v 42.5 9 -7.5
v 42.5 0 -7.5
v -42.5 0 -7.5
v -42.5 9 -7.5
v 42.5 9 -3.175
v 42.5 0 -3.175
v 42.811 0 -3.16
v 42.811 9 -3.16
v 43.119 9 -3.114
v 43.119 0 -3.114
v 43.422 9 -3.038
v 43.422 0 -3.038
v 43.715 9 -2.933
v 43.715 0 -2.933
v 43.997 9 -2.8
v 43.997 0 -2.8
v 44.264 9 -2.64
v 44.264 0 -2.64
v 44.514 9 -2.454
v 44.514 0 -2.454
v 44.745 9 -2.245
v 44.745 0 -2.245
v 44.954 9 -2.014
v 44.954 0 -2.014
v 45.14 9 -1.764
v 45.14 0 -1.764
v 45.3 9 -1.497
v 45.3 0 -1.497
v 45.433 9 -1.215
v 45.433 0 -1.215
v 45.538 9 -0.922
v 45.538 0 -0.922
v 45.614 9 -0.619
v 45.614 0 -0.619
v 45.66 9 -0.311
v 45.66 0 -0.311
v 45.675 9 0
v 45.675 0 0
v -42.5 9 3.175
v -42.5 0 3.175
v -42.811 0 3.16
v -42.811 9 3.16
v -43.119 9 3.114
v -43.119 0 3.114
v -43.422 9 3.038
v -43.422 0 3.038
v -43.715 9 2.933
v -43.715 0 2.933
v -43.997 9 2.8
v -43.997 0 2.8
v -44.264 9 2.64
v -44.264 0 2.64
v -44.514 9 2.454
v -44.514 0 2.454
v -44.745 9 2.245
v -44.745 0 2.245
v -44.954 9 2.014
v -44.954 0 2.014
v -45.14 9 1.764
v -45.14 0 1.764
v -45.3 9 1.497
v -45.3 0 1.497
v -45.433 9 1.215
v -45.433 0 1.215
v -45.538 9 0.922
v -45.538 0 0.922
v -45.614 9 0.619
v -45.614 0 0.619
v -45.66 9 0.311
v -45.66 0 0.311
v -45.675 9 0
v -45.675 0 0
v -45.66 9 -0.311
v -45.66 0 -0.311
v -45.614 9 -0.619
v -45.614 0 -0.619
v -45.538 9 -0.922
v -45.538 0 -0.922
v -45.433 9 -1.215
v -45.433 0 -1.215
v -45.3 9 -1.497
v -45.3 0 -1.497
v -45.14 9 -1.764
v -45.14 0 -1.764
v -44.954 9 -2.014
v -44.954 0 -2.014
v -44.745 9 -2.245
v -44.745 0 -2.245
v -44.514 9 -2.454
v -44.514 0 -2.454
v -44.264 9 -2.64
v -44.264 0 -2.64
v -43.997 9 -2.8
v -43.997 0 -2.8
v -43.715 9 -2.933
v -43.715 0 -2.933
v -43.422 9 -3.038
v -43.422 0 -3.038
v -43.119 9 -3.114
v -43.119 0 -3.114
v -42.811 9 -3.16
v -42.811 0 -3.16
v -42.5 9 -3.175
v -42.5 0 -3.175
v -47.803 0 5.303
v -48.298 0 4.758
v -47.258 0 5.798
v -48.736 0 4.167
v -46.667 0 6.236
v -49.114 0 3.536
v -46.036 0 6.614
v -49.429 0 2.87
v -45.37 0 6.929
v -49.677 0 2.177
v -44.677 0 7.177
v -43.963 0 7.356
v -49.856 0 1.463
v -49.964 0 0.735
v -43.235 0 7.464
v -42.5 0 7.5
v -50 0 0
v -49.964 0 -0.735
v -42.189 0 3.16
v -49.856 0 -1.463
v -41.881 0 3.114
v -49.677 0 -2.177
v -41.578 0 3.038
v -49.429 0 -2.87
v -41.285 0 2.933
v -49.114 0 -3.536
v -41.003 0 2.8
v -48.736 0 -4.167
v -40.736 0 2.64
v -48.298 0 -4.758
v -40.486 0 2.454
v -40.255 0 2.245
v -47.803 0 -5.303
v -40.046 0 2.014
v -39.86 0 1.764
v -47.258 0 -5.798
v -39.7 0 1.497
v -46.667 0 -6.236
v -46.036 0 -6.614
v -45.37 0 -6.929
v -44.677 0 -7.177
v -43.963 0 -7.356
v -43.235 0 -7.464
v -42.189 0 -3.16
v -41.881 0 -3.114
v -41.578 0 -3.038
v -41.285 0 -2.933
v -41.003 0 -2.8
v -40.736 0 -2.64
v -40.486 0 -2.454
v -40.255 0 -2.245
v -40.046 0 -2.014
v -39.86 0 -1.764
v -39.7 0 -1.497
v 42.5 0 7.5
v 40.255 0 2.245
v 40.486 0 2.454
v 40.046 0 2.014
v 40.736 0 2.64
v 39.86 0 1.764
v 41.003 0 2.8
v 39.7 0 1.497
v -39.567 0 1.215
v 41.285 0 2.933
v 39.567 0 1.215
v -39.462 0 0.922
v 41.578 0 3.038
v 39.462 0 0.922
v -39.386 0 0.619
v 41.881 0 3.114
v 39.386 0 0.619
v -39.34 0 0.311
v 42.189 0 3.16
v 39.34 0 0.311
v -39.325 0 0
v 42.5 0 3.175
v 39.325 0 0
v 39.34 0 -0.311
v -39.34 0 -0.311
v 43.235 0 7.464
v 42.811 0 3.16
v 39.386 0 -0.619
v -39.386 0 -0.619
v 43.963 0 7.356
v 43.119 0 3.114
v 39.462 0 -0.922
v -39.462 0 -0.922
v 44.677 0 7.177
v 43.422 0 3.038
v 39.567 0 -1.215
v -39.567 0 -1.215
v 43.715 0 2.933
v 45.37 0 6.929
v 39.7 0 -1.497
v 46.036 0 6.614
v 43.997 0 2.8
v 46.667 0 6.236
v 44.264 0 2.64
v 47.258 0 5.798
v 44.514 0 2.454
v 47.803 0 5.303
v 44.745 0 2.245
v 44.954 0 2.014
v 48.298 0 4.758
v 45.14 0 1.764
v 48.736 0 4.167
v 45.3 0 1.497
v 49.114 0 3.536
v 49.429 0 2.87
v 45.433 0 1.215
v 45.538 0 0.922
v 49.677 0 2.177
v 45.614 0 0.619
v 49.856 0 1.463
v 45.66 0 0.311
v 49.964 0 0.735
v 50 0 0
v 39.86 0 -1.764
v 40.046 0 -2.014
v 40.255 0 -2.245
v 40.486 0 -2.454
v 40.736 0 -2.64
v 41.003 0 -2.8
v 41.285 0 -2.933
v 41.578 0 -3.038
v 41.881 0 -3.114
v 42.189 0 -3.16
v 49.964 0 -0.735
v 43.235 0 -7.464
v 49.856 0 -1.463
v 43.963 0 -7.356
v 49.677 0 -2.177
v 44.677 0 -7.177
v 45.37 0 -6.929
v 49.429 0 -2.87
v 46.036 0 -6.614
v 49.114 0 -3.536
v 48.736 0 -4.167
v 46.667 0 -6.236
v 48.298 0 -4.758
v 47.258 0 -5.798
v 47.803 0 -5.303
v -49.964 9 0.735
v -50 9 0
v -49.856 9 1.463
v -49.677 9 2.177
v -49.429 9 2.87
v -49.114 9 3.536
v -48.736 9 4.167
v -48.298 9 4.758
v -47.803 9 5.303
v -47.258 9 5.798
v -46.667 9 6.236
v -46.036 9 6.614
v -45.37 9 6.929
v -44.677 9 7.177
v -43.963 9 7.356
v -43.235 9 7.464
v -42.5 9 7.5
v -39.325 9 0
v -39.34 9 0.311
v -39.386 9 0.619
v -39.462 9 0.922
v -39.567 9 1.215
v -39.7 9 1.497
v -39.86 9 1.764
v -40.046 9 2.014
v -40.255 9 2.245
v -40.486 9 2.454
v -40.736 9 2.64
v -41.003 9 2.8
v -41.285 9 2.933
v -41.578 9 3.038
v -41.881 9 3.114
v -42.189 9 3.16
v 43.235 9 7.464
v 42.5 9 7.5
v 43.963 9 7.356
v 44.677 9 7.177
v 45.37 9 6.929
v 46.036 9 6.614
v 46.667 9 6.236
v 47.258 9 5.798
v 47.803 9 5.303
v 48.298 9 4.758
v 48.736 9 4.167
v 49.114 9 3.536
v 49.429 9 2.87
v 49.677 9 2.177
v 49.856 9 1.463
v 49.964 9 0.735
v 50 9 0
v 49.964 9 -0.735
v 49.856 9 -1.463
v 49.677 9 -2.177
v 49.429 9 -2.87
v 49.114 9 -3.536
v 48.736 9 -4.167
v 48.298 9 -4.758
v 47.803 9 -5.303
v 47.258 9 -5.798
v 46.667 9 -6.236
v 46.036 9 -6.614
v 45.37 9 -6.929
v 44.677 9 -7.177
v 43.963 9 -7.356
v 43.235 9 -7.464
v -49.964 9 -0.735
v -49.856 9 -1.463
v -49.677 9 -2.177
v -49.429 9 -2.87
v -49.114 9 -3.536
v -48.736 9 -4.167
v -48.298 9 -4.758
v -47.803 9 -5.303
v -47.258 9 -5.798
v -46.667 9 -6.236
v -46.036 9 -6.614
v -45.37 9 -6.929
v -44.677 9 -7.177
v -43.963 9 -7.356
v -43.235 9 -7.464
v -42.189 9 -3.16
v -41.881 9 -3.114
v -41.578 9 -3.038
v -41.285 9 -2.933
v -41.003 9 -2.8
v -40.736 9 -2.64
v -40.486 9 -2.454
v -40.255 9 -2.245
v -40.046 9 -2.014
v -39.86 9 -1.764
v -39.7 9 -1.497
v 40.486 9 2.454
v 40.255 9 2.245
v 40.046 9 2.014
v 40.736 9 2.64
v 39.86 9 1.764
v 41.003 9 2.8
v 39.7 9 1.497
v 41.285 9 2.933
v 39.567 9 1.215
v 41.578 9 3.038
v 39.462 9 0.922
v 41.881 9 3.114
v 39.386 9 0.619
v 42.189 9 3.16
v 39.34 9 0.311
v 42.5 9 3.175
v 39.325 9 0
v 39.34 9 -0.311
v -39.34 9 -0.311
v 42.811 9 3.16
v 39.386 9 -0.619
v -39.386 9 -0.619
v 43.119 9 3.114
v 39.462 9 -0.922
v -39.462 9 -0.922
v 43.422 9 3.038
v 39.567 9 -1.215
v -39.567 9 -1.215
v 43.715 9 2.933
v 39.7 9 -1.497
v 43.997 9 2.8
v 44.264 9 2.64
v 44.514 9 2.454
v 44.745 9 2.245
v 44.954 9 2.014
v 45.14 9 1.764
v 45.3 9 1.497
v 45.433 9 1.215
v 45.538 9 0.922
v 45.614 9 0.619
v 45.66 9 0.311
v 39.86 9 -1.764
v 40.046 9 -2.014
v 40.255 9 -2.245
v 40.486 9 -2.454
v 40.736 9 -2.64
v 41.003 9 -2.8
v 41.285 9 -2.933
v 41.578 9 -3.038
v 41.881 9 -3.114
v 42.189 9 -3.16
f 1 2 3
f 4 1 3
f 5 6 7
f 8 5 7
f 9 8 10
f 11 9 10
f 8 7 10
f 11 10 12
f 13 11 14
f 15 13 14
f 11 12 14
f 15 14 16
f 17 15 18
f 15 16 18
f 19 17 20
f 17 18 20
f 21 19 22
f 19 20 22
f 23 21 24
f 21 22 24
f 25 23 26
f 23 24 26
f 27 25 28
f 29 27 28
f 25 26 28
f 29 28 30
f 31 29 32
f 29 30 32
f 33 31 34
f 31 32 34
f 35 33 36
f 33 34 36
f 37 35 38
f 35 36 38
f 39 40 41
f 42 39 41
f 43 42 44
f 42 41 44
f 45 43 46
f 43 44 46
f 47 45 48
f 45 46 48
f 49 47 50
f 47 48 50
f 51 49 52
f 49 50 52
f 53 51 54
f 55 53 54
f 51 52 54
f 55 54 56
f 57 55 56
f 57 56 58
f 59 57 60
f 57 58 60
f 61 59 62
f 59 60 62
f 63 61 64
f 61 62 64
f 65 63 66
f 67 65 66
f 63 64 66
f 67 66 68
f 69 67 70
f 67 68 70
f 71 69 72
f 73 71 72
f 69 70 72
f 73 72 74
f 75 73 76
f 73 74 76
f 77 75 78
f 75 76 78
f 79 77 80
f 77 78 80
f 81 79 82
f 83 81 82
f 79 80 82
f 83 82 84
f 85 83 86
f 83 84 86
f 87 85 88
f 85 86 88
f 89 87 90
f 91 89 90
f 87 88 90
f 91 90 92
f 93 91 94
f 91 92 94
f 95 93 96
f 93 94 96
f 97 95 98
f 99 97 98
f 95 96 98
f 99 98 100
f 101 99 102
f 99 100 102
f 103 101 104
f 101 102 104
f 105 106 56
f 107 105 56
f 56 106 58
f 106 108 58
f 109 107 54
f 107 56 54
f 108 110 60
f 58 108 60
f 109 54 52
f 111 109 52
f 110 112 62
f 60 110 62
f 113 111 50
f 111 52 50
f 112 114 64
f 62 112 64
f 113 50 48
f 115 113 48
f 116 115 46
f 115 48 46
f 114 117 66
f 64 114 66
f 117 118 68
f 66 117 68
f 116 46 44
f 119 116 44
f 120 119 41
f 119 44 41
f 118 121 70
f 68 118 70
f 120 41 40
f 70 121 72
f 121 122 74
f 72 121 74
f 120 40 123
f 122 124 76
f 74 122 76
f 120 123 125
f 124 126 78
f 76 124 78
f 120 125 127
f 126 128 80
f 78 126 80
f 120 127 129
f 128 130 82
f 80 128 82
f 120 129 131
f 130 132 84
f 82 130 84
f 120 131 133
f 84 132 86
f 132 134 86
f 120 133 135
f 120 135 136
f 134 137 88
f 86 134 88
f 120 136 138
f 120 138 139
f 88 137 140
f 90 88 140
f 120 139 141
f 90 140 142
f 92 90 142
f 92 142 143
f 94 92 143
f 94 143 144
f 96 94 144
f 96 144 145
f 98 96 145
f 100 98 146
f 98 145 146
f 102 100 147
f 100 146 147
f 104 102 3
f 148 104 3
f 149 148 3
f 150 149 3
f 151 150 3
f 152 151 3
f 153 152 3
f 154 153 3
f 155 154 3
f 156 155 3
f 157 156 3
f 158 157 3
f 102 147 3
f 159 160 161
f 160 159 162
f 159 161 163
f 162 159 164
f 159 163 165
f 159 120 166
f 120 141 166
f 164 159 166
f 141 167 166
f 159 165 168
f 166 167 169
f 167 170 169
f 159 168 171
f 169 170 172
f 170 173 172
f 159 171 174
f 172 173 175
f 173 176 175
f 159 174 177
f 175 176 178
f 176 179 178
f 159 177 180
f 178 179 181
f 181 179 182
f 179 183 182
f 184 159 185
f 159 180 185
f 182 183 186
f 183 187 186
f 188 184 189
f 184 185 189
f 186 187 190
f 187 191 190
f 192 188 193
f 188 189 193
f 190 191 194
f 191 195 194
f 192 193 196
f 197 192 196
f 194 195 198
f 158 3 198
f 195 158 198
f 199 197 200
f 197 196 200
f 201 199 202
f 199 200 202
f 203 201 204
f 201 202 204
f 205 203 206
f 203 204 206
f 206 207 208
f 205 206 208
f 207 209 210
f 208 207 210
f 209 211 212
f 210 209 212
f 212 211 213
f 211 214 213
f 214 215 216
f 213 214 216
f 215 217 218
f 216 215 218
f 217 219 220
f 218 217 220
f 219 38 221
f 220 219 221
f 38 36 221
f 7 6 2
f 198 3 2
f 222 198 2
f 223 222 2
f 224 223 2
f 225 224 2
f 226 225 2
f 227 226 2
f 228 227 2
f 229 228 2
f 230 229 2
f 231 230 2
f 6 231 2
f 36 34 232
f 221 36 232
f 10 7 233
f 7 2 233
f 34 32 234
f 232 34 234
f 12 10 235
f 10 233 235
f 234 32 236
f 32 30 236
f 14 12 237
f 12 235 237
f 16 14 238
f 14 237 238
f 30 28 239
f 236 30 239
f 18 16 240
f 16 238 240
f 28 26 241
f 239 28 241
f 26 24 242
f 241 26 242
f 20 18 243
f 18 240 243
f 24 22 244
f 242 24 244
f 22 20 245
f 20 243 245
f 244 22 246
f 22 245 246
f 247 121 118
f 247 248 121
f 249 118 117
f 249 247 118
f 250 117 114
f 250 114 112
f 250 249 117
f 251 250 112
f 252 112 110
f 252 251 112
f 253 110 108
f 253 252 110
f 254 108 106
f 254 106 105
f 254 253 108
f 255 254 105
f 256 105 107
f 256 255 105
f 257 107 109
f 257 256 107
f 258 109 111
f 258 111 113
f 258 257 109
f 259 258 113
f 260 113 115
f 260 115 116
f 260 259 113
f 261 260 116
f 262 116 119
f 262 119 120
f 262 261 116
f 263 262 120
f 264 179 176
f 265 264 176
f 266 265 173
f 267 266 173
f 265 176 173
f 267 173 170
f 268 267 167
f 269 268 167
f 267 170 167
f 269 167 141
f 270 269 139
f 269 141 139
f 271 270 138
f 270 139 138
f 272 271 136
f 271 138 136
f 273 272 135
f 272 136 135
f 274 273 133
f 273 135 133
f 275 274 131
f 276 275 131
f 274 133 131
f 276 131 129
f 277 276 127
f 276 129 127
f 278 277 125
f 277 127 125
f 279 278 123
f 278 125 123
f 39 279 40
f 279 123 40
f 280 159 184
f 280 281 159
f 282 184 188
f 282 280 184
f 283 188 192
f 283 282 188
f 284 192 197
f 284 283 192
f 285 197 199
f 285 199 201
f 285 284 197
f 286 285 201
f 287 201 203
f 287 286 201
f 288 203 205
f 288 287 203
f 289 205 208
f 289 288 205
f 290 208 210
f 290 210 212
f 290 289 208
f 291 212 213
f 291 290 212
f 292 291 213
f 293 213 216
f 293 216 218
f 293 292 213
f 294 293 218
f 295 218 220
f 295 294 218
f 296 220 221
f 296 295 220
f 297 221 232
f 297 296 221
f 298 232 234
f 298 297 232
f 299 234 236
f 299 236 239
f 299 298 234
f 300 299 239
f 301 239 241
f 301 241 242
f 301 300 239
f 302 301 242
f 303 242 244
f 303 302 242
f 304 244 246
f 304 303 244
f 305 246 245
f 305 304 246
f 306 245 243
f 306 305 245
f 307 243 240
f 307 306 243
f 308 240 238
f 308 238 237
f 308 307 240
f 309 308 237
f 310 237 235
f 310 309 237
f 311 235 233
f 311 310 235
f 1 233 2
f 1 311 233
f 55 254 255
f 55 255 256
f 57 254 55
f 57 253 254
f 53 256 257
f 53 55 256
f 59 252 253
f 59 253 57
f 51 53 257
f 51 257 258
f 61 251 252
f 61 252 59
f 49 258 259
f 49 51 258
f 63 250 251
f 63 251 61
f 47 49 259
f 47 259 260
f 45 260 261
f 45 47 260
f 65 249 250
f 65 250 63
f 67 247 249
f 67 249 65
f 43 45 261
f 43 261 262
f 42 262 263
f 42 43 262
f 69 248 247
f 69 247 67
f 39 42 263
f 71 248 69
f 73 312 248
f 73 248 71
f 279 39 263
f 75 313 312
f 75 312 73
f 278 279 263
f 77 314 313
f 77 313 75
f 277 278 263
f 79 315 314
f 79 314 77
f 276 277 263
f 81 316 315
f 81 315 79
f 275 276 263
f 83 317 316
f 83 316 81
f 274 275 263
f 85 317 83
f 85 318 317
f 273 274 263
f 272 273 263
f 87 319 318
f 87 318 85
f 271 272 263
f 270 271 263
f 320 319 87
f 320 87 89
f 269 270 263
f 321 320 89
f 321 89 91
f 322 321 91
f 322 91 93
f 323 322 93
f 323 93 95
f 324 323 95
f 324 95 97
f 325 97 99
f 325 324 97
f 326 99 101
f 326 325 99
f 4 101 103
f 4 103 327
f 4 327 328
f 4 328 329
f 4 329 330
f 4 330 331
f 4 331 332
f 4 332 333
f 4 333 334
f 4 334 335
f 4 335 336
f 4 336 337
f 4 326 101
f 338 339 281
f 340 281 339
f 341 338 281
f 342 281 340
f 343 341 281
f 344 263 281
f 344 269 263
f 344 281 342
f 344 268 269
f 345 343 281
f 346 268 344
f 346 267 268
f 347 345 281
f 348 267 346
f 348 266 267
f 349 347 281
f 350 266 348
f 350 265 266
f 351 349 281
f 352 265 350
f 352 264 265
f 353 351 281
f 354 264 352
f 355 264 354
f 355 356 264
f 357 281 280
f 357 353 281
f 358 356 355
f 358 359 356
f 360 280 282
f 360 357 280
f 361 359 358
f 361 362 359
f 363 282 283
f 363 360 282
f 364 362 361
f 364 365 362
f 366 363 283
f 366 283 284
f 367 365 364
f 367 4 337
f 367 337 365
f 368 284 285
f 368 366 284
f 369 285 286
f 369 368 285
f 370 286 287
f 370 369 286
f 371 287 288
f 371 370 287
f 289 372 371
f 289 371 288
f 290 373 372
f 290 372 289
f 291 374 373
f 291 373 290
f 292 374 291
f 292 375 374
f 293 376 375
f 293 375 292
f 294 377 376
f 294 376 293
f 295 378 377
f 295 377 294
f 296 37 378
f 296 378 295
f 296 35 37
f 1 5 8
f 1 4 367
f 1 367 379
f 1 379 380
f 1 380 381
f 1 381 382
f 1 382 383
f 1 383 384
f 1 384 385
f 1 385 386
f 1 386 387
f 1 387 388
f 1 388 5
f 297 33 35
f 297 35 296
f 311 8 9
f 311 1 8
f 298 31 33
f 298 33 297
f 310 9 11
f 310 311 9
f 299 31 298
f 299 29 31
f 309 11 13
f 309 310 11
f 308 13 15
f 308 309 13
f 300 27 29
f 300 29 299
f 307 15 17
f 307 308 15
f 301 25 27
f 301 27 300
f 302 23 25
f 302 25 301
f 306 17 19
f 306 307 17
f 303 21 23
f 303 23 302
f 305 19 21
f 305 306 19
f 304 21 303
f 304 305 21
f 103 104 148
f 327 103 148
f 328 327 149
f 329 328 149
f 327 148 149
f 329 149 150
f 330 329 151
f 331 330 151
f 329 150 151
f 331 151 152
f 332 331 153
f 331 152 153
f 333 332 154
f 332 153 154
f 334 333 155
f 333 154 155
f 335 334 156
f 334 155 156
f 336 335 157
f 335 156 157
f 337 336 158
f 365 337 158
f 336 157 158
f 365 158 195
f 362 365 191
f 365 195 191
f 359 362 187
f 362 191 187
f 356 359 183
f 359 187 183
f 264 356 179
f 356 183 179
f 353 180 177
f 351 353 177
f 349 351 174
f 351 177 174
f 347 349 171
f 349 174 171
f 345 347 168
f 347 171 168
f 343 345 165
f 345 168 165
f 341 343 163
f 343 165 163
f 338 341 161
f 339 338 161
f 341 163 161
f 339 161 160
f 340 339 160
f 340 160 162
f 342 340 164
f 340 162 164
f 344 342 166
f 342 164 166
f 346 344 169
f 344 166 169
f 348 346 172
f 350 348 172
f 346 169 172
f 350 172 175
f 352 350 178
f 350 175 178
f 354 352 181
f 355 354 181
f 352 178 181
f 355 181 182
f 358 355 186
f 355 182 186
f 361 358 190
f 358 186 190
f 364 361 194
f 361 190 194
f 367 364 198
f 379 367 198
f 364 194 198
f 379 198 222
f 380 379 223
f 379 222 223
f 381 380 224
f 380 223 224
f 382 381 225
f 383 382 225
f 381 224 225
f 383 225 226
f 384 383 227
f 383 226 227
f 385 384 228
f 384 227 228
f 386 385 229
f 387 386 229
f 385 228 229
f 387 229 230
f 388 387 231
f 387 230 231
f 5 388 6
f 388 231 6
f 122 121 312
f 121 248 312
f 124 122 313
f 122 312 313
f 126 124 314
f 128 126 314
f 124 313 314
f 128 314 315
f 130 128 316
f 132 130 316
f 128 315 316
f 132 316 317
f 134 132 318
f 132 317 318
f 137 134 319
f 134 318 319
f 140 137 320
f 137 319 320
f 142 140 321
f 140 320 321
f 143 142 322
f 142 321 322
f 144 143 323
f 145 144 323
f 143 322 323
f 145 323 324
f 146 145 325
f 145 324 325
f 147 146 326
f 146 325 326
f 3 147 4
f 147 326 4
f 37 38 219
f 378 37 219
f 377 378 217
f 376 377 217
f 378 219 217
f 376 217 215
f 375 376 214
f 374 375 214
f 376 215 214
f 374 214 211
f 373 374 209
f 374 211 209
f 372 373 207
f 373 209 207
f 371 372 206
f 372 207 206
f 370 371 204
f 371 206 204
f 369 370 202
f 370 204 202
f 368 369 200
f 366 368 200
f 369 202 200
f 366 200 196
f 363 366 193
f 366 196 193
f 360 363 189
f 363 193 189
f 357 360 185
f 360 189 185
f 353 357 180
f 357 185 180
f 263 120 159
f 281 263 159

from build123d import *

# Parameters (mm, degrees)
BOSS_EXTRUDE1_DEPTH = 9
FILLET1_R           = 7.5


with BuildPart() as part:
    # Sketch1 → Boss-Extrude1 (new body)
    with BuildSketch(Plane(origin=(0, 0, 0), x_dir=(1, 0, 0), z_dir=(0, 1, 0))):
        with BuildLine():
            Line((-50, 7.5), (-50, -7.5))
            Line((-50, -7.5), (-42.5, -7.5))
            Line((-42.5, -7.5), (-42.5, -3.175))
            ThreePointArc((-42.5, -3.175), (-45.675, 0), (-42.5, 3.175))
            Line((-42.5, 3.175), (-42.5, 7.5))
            Line((-42.5, 7.5), (-50, 7.5))
        make_face()
        with BuildLine():
            Line((-42.5, -3.175), (-42.5, -7.5))
            Line((-42.5, -7.5), (42.5, -7.5))
            Line((42.5, -7.5), (42.5, -3.175))
            ThreePointArc((42.5, -3.175), (39.325, 0), (42.5, 3.175))
            Line((42.5, 3.175), (42.5, 7.5))
            Line((42.5, 7.5), (-42.5, 7.5))
            Line((-42.5, 7.5), (-42.5, 3.175))
            ThreePointArc((-42.5, 3.175), (-40.25493597, 2.24506403), (-39.325, 0))
            ThreePointArc((-39.325, 0), (-40.25493597, -2.24506403), (-42.5, -3.175))
        make_face()
        with BuildLine():
            Line((42.5, -3.175), (42.5, -7.5))
            Line((42.5, -7.5), (50, -7.5))
            Line((50, -7.5), (50, 7.5))
            Line((50, 7.5), (42.5, 7.5))
            Line((42.5, 7.5), (42.5, 3.175))
            ThreePointArc((42.5, 3.175), (44.74506403, 2.24506403), (45.675, 0))
            ThreePointArc((45.675, 0), (44.74506403, -2.24506403), (42.5, -3.175))
        make_face()
    extrude(amount=BOSS_EXTRUDE1_DEPTH)

    # Fillet1
    fillet1_edges = [part.edges().sort_by_distance(p)[0] for p in [
        (50, 4.5, 7.5),
        (50, 4.5, -7.5),
        (-50, 4.5, 7.5),
        (-50, 4.5, -7.5),
    ]]
    fillet(fillet1_edges, radius=FILLET1_R - 0.0001)  # a hair under: the kernel refuses the full size


solid = part.part
